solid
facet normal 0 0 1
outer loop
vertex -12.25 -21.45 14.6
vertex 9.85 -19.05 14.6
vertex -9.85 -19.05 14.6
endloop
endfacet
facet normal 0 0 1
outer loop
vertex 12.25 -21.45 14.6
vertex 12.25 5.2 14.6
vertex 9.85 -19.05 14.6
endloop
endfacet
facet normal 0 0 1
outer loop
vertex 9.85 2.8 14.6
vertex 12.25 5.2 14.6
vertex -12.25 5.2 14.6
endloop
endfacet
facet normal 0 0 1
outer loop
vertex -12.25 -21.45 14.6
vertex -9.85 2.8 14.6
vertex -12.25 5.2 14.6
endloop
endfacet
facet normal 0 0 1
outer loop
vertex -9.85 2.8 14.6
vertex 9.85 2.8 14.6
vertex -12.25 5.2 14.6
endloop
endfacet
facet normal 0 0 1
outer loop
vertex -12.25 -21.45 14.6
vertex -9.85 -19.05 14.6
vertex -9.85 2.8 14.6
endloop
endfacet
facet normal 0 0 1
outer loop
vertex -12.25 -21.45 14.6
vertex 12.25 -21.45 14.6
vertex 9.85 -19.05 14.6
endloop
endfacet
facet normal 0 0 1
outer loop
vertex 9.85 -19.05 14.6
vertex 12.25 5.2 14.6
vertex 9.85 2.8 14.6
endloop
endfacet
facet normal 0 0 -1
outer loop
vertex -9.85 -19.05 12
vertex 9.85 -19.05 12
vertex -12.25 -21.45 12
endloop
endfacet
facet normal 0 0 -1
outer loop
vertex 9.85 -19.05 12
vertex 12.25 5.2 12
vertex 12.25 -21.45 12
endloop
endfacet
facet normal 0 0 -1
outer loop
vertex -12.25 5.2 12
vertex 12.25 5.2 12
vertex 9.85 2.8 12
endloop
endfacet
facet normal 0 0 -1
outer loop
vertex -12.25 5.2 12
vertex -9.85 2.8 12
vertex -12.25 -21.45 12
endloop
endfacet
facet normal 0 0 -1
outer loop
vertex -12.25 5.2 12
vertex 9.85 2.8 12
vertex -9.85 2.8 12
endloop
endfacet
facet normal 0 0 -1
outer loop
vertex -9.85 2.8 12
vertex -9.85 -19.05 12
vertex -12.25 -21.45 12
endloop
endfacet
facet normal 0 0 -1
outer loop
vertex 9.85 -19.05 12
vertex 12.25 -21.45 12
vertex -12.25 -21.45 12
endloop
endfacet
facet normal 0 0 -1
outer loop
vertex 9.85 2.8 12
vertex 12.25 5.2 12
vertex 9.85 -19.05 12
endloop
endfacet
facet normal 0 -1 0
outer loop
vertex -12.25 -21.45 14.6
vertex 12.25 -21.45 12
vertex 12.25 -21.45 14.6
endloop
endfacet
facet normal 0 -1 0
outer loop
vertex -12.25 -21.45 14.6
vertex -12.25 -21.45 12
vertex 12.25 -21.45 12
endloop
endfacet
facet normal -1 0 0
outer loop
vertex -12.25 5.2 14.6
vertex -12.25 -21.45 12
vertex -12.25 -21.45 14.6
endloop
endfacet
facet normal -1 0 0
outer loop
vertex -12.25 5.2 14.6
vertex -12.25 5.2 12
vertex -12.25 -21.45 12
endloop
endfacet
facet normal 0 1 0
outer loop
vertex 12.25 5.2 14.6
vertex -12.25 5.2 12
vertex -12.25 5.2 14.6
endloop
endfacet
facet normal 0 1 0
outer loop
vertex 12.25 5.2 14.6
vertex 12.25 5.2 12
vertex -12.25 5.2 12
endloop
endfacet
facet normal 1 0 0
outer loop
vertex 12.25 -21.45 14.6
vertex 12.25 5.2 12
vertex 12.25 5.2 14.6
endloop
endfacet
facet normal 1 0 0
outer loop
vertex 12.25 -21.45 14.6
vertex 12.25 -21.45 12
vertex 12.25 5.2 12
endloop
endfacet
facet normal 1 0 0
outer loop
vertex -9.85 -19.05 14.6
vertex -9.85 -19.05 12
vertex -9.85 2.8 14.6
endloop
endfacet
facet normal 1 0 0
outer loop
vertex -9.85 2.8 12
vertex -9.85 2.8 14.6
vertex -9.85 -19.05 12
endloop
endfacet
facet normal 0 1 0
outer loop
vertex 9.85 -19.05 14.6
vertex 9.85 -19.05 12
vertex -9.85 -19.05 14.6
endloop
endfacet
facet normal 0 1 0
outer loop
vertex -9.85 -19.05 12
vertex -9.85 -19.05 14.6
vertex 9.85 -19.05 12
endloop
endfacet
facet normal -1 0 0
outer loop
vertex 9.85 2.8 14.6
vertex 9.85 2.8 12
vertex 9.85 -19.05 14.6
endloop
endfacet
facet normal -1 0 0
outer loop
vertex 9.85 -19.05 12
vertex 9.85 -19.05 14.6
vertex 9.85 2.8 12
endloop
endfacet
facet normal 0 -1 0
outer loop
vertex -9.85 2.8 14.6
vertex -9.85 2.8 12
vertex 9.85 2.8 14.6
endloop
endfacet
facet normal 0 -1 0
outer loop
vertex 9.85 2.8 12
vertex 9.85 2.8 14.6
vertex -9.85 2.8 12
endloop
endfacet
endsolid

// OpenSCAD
include <../lib/servo-duct-manifold-lib.scad>;
$fn = 96;
sensor_cap_gasket();
